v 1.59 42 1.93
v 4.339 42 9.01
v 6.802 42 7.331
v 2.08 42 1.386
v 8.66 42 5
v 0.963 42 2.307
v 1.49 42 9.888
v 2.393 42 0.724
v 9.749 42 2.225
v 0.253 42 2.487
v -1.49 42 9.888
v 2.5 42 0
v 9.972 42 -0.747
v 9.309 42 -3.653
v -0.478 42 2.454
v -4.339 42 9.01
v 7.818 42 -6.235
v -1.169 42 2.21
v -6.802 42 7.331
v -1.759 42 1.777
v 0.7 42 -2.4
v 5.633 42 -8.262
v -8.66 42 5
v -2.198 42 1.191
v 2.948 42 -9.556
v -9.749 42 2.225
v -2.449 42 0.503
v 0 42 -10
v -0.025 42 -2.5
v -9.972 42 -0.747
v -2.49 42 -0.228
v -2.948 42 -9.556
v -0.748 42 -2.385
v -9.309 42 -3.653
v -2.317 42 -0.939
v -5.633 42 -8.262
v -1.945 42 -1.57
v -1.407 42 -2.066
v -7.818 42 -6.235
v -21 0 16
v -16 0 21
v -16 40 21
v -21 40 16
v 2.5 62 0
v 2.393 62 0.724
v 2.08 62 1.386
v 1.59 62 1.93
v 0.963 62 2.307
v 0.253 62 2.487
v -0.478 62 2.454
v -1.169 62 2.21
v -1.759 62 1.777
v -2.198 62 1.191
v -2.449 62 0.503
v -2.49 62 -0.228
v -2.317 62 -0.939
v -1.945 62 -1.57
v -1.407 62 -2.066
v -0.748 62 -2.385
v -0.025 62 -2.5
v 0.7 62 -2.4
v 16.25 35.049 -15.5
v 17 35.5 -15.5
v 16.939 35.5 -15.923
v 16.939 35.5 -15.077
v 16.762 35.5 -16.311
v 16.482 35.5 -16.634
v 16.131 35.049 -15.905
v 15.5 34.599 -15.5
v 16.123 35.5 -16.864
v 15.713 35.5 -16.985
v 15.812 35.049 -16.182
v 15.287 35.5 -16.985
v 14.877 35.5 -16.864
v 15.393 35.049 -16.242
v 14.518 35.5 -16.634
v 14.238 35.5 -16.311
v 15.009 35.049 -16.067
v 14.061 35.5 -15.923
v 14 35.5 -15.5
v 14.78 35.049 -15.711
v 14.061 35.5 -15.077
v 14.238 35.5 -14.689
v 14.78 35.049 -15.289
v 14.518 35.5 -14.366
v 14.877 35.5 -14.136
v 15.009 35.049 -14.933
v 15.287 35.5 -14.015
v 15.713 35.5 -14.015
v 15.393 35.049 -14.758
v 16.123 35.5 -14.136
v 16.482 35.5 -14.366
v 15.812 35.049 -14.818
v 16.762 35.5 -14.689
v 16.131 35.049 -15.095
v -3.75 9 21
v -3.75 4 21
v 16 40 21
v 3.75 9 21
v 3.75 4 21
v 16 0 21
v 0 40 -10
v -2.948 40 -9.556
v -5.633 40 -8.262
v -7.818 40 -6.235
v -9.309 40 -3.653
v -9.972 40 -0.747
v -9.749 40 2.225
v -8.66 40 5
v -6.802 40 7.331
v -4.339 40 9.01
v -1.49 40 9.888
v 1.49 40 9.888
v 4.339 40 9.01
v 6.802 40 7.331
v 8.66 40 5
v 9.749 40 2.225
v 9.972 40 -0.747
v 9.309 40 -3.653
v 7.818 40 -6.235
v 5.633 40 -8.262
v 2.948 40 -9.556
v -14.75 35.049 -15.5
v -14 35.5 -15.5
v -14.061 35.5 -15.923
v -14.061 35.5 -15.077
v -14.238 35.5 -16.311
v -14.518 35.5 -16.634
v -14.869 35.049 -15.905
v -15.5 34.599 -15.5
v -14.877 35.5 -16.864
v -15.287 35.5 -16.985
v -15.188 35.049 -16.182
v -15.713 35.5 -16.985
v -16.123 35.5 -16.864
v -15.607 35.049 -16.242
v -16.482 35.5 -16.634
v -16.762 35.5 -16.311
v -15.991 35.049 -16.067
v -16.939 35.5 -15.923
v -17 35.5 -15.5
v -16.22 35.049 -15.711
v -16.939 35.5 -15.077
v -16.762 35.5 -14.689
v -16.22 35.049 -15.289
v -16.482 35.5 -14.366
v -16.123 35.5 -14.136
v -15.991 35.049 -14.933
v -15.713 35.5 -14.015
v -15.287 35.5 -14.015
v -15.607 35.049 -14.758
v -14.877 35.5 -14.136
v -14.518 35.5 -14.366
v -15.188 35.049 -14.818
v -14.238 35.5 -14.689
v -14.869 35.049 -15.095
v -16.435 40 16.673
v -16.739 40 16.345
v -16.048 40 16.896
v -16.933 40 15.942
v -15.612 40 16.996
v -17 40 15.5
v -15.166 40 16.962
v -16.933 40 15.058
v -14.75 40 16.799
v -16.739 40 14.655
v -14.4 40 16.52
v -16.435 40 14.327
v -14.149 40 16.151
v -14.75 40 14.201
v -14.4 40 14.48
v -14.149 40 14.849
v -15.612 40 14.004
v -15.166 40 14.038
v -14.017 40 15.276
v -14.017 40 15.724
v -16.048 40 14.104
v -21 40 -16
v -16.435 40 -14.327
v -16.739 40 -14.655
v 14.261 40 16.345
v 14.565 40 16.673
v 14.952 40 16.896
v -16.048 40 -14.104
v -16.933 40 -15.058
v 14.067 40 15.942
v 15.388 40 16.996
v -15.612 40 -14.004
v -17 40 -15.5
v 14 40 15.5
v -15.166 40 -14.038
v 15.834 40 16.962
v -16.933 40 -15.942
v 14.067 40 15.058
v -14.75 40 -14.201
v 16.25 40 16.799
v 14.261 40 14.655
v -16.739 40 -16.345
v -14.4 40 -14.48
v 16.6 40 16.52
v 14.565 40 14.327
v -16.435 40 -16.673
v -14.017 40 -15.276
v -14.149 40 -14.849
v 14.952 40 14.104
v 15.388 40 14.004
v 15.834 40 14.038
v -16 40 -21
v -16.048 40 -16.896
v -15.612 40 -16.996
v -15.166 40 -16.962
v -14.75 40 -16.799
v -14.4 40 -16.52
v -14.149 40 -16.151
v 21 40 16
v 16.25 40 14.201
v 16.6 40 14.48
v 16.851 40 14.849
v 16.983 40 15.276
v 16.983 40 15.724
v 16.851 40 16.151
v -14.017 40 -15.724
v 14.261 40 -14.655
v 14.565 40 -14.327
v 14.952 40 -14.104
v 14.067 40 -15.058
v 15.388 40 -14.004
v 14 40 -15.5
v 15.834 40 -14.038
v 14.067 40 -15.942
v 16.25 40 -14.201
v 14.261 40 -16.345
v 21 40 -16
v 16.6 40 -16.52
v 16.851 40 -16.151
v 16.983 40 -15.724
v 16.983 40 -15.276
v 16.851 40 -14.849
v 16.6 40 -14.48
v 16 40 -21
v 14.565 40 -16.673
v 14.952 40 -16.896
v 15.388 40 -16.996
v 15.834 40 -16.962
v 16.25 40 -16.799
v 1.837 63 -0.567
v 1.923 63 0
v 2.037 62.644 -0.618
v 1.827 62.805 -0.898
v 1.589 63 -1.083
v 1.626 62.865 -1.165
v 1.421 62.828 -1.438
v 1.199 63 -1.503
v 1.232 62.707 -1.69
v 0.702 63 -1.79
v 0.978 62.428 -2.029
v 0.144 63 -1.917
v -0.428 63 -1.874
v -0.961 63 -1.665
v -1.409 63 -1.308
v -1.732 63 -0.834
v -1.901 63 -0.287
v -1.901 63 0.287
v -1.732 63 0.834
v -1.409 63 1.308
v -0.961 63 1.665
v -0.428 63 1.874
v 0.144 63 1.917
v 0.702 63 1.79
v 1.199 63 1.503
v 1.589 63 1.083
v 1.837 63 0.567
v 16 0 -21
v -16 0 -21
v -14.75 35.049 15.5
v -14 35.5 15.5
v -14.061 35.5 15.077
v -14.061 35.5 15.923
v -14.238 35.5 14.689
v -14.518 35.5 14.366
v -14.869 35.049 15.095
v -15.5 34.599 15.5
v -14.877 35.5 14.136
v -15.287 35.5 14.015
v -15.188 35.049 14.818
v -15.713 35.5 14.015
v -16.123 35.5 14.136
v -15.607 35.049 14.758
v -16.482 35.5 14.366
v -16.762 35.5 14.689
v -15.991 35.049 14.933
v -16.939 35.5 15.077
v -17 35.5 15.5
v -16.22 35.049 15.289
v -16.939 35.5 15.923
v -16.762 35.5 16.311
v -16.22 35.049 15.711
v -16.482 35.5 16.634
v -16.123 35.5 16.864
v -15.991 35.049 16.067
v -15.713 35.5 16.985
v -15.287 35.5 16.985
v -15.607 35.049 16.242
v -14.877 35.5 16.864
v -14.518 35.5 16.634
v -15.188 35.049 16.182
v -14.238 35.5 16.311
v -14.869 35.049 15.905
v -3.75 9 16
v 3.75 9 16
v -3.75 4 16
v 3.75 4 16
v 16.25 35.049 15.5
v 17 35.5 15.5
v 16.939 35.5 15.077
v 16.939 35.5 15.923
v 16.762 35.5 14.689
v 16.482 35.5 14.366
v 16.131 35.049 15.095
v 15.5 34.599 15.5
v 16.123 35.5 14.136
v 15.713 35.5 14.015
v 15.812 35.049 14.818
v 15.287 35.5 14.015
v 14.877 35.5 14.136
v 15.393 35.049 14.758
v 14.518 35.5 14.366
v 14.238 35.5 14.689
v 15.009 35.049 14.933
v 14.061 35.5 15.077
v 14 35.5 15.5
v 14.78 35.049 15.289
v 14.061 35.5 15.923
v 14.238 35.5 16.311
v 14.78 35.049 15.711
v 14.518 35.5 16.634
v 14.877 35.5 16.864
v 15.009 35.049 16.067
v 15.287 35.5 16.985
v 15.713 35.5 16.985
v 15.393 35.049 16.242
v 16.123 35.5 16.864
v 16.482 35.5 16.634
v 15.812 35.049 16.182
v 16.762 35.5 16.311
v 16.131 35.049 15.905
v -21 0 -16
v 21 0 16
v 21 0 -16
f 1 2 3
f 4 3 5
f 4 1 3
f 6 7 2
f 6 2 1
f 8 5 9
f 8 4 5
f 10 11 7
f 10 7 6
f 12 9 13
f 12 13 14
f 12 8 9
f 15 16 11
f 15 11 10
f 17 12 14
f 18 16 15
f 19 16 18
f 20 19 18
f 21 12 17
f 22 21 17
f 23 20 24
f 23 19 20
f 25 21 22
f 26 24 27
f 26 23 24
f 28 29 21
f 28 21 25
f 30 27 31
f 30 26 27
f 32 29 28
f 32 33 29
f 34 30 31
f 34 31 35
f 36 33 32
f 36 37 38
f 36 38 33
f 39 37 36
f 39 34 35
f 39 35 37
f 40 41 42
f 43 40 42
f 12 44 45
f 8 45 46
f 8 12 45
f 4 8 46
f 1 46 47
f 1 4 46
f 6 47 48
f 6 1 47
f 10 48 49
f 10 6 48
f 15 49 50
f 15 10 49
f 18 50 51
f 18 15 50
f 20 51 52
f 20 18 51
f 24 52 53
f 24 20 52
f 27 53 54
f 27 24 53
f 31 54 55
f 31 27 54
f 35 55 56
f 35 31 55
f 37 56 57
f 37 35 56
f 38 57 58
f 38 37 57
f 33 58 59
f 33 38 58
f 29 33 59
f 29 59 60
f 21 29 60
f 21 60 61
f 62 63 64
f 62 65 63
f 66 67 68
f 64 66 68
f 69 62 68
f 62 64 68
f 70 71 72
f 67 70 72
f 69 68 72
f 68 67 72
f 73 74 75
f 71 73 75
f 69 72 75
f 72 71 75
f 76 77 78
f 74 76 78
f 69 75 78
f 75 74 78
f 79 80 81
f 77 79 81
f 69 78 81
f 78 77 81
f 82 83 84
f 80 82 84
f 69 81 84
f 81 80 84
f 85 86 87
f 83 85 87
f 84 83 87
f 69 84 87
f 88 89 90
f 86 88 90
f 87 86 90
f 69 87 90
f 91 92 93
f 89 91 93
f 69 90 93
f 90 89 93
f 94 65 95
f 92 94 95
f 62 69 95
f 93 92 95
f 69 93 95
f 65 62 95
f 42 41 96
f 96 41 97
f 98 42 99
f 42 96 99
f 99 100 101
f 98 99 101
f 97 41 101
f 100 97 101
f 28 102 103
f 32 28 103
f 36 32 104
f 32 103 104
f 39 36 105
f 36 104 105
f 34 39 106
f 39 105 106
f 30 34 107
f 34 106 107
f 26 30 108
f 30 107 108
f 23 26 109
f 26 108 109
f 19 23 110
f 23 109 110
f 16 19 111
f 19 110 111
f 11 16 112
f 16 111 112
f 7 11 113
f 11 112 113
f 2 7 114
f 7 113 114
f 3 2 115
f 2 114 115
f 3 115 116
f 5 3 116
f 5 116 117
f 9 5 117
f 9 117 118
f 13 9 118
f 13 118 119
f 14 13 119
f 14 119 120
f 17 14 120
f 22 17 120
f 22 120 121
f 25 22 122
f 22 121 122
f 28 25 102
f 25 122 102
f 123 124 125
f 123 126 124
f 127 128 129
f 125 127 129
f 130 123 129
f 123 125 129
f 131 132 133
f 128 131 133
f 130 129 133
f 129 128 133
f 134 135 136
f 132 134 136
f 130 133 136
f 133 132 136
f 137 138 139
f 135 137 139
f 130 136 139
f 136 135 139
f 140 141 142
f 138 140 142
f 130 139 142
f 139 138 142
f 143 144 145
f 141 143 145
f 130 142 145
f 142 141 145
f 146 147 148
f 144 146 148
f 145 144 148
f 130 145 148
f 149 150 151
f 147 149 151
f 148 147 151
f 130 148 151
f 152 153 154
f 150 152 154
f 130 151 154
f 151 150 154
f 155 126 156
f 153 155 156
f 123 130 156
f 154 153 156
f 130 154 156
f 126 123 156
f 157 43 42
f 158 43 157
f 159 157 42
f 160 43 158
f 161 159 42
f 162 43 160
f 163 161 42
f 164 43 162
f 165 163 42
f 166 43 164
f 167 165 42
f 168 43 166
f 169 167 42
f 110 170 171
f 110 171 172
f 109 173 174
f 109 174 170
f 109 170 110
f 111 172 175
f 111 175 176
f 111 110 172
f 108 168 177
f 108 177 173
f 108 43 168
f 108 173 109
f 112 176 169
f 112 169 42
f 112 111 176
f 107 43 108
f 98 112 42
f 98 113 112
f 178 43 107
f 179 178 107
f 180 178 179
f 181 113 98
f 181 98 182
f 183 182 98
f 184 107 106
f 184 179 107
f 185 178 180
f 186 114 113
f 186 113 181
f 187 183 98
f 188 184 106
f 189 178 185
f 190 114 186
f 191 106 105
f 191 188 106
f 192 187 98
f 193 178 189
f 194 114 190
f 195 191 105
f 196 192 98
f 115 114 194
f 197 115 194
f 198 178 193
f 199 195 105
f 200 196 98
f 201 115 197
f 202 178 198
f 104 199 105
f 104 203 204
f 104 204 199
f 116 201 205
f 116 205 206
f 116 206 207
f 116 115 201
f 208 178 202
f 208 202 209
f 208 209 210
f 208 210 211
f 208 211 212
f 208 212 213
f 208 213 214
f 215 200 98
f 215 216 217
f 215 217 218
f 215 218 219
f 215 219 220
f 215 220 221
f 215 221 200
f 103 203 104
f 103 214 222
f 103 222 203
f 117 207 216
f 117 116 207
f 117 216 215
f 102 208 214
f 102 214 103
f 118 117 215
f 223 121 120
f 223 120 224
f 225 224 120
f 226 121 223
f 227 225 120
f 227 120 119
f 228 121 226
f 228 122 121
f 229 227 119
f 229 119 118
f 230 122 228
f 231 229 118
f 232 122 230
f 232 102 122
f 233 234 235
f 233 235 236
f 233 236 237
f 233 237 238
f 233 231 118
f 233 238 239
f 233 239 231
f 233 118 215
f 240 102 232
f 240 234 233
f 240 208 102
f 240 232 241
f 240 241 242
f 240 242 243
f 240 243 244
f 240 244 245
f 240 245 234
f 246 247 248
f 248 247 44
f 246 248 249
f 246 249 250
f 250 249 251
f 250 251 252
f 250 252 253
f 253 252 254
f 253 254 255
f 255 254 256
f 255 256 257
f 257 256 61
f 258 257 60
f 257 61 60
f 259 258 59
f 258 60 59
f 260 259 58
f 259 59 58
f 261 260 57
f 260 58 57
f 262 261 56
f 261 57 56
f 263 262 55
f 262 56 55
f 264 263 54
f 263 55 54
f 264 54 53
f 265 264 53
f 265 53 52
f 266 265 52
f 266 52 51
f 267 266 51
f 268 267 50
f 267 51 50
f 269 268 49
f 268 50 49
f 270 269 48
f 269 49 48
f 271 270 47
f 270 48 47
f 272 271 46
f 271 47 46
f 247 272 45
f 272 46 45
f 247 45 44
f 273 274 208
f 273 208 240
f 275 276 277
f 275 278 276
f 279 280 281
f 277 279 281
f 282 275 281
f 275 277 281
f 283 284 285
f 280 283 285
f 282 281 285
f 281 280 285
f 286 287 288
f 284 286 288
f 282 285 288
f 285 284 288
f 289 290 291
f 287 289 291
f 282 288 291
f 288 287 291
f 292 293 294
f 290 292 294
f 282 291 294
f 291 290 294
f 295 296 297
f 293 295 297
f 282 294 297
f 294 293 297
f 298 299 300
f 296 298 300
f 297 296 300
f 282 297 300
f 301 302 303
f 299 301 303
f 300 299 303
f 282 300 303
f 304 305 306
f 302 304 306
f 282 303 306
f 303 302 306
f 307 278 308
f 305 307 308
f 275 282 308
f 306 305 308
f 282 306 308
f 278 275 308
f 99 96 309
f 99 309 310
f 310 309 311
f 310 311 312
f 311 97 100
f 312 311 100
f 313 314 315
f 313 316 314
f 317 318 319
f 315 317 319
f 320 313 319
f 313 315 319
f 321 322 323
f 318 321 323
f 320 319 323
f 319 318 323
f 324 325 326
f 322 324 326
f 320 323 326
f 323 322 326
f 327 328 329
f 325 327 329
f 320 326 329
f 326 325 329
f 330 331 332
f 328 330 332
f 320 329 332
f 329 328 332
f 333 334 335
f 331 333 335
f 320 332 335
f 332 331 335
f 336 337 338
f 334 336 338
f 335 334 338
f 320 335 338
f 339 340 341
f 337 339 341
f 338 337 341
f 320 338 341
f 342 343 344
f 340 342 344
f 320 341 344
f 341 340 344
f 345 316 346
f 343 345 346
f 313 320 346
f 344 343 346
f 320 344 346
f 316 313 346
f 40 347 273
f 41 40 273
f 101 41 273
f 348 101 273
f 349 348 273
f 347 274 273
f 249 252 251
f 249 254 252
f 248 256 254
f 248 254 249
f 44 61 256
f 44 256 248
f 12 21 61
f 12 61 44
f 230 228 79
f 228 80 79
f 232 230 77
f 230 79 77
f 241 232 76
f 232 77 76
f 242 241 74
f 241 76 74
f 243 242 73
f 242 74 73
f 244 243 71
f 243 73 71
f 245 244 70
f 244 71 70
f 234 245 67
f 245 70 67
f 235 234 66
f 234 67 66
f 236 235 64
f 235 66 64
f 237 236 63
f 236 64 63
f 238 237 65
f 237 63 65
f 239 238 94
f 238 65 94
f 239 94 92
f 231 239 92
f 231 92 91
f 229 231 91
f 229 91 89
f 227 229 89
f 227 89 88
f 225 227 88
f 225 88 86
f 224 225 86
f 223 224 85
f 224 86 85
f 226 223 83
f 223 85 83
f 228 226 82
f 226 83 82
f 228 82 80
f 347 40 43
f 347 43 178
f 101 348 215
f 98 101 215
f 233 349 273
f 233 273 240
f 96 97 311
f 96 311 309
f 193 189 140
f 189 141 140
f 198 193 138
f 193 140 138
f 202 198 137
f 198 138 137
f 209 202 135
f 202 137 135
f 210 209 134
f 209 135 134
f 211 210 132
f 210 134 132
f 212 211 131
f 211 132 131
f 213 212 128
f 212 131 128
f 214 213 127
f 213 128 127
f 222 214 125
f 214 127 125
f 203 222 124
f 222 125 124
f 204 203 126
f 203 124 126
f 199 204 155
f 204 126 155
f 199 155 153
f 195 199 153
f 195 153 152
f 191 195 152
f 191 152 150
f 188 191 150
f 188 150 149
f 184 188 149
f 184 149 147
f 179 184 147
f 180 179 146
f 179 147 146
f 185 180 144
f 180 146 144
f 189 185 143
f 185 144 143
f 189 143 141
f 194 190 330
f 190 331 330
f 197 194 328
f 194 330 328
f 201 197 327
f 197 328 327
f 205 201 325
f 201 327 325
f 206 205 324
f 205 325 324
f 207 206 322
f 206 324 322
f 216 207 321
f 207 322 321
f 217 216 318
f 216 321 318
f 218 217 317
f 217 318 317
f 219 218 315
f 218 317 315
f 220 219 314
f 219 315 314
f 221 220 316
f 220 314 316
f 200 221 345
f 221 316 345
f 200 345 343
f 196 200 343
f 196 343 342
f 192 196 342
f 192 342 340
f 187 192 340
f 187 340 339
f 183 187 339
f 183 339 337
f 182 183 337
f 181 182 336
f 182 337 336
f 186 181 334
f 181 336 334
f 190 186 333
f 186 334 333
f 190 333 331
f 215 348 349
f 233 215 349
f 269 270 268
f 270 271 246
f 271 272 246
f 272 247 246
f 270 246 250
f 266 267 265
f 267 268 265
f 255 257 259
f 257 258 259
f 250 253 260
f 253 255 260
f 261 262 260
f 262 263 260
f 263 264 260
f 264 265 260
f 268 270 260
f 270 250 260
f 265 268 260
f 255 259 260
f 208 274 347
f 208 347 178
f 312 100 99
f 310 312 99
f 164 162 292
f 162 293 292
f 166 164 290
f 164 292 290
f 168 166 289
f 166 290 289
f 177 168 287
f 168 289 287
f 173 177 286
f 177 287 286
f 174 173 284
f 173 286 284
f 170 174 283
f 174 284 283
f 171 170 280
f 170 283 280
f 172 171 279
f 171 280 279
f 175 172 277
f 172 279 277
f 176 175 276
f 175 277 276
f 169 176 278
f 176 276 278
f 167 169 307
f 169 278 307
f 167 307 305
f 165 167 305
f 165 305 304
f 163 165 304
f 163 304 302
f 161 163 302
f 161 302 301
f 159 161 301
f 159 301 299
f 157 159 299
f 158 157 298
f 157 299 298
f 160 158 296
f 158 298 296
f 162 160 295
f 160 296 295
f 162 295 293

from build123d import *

# Parameters (mm, degrees)
SKETCH1_W                 = 42
SKETCH1_H                 = 42
BOSS_EXTRUDE1_DEPTH       = 40
F_3_0MM_DOWEL_HOLE1_D     = 3
F_3_0MM_DOWEL_HOLE1_DEPTH = 4.5
F_3_0MM_DOWEL_HOLE1_TIP   = 0.901290929
SKETCH2_R                 = 10
BOSS_EXTRUDE2_DEPTH       = 2
BOSS_EXTRUDE3_DEPTH       = 23
SKETCH10_W                = 7.5
SKETCH10_H                = 5
CUT_EXTRUDE1_DEPTH        = 5
CHAMFER2_SIZE             = 5


with BuildPart() as part:
    # Sketch1 → Boss-Extrude1 (new body)
    with BuildSketch(Plane(origin=(0, 0, 0), x_dir=(1, 0, 0), z_dir=(0, 1, 0))):
        Rectangle(SKETCH1_W, SKETCH1_H)
    extrude(amount=BOSS_EXTRUDE1_DEPTH)

    # Ø3.0mm Dowel Hole1
    with Locations(Plane(origin=(0, 40, 0), x_dir=(1, 0, 0), z_dir=(0, 1, 0))):
        with Locations((-15.5, 15.5), (15.5, 15.5), (15.5, -15.5), (-15.5, -15.5)):
            Hole(F_3_0MM_DOWEL_HOLE1_D / 2, depth=F_3_0MM_DOWEL_HOLE1_DEPTH)
            with Locations((0, 0, -(F_3_0MM_DOWEL_HOLE1_DEPTH + F_3_0MM_DOWEL_HOLE1_TIP / 2))):  # 118° drill point
                Cone(0, F_3_0MM_DOWEL_HOLE1_D / 2, F_3_0MM_DOWEL_HOLE1_TIP, mode=Mode.SUBTRACT)

    # Sketch2 → Boss-Extrude2 (add)
    with BuildSketch(Plane(origin=(0, 40, 0), x_dir=(1, 0, 0), z_dir=(0, 1, 0))):
        with Locations(Location((0, 0, 0), (0, 0, 90))):
            Circle(SKETCH2_R)
    extrude(amount=BOSS_EXTRUDE2_DEPTH)

    # Sketch4 → Boss-Extrude3 (add)
    with BuildSketch(Plane(origin=(0, 40, 0), x_dir=(1, 0, 0), z_dir=(0, 1, 0))):
        with BuildLine():
            Line((0.7, 2.4), (2.5, 0))
            ThreePointArc((2.5, 0), (-2, -1.5), (0.7, 2.4))
        make_face()
    extrude(amount=BOSS_EXTRUDE3_DEPTH)

    # Sketch10 → Cut-Extrude1 (cut)
    with BuildSketch(Plane.XY.offset(21)):
        with Locations((0, 6.5)):
            Rectangle(SKETCH10_W, SKETCH10_H)
    extrude(amount=-CUT_EXTRUDE1_DEPTH, mode=Mode.SUBTRACT)

    # Chamfer1: read off the stored shape, not the designer's step
    # Chamfer1 outline → Chamfer1 (revolve, cut)
    with BuildSketch(Plane.XY):
        Polygon((2.5, 63), (1.922649731, 63), (2.5, 62), align=None)
    revolve(axis=Axis((0, 0, 0), (0, 1, 0)), mode=Mode.SUBTRACT)

    # Chamfer2
    chamfer2_edges = [part.edges().sort_by_distance(p)[0] for p in [
        (21, 20, 21),
        (-21, 20, 21),
        (-21, 20, -21),
        (21, 20, -21),
    ]]
    chamfer(chamfer2_edges, length=CHAMFER2_SIZE)


solid = part.part
